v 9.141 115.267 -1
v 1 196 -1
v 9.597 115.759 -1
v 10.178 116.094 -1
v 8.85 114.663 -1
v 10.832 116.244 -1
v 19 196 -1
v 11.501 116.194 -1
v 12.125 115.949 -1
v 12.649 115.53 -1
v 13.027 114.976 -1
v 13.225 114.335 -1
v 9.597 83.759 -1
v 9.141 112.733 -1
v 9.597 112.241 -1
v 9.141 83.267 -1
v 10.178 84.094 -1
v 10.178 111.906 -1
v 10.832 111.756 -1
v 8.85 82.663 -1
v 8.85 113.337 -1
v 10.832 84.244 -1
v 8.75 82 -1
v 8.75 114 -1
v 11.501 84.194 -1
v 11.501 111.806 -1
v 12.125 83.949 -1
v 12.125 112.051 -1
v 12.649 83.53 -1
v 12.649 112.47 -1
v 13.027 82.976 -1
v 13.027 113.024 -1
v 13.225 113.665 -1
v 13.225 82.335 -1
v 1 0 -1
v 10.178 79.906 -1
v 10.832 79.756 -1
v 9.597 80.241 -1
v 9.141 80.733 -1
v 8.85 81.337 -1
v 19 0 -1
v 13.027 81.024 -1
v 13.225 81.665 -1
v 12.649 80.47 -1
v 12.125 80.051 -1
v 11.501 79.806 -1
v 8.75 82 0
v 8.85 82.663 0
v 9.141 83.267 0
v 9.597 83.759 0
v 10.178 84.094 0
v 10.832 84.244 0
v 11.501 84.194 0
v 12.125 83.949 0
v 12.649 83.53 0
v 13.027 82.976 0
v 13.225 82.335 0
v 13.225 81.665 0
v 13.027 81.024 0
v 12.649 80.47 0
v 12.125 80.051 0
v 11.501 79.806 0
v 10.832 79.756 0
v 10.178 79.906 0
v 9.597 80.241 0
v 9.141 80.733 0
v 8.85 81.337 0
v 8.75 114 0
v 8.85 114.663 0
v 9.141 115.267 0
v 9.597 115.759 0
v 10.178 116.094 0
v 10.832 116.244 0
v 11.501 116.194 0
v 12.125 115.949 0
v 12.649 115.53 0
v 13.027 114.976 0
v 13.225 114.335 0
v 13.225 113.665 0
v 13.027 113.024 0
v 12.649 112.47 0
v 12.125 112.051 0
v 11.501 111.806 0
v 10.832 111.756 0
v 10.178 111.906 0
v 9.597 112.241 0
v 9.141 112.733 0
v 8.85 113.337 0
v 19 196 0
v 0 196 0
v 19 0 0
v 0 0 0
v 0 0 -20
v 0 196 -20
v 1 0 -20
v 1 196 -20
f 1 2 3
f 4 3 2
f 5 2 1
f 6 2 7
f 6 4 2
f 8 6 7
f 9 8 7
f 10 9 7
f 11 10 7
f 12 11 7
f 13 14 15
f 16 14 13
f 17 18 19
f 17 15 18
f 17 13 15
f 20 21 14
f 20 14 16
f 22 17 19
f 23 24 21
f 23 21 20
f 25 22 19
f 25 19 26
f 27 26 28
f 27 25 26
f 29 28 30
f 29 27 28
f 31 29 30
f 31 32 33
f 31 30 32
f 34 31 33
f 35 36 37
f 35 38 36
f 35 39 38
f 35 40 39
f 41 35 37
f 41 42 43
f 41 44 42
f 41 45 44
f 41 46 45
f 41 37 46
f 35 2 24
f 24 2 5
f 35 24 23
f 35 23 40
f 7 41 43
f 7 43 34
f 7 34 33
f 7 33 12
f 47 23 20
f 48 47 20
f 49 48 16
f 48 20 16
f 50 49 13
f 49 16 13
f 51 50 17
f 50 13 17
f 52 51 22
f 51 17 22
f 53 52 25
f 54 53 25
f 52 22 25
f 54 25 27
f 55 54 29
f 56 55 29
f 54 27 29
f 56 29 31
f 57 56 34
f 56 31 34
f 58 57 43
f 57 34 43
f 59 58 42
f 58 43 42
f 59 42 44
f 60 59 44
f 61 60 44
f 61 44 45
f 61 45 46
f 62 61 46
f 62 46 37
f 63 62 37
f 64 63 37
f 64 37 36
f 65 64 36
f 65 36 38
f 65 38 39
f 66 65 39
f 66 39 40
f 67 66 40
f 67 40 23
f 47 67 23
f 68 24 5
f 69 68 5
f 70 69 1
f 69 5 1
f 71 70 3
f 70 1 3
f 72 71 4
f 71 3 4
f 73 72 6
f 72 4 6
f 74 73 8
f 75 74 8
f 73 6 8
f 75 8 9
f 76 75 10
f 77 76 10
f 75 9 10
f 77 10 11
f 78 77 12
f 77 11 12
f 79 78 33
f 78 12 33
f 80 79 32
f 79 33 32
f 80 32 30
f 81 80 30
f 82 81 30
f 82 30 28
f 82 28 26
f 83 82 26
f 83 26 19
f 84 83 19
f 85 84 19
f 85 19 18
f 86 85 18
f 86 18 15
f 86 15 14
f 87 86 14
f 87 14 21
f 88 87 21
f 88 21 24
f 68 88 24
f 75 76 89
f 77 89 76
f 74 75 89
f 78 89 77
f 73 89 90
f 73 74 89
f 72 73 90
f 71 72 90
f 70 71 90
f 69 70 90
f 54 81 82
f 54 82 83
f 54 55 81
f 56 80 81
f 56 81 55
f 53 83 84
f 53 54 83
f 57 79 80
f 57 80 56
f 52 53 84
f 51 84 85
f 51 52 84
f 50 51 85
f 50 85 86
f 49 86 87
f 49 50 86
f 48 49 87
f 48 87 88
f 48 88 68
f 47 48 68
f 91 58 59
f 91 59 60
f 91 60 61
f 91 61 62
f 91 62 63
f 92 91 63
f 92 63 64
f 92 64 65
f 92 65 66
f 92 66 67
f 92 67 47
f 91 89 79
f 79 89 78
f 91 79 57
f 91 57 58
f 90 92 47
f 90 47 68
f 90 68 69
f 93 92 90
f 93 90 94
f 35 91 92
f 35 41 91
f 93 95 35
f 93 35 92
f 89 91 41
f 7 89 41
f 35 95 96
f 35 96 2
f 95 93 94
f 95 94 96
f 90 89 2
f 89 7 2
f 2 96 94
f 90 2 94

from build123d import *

# Parameters (mm, degrees)
EXTRUDE_1_DEPTH     = 196
SKETCH_2_W          = 1
SKETCH_2_H          = 196
CUT_EXTRUDE_1_DEPTH = 1
SKETCH1_R           = 2.25
CUT_EXTRUDE1_DEPTH  = 2


with BuildPart() as part:
    # Эскиз1 → Бобышка-Вытянуть1 (new body)
    with BuildSketch(Plane(origin=(0, 0, 0), x_dir=(1, 0, 0), z_dir=(0, 1, 0))):
        Polygon((0, 0), (0, 20), (1, 20), (1, 1), (20, 1), (20, 0), align=None)
    extrude(amount=EXTRUDE_1_DEPTH)

    # Эскиз2 → Вырез-Вытянуть1 (cut)
    with BuildSketch(Plane(origin=(20, 0, 0), x_dir=(0, 0, -1), z_dir=(1, 0, 0))):
        with Locations((0.5, 98)):
            Rectangle(SKETCH_2_W, SKETCH_2_H)
    extrude(amount=-CUT_EXTRUDE_1_DEPTH, mode=Mode.SUBTRACT)

    # Sketch1 → Cut-Extrude1 (cut, through all)
    with BuildSketch(Plane(origin=(0, 0, -1), x_dir=(-1, 0, 0), z_dir=(0, 0, -1))):
        with Locations((-11, 82)):
            Circle(SKETCH1_R)
        with Locations((-11, 114)):
            Circle(SKETCH1_R)
    extrude(amount=-CUT_EXTRUDE1_DEPTH, mode=Mode.SUBTRACT)


solid = part.part
